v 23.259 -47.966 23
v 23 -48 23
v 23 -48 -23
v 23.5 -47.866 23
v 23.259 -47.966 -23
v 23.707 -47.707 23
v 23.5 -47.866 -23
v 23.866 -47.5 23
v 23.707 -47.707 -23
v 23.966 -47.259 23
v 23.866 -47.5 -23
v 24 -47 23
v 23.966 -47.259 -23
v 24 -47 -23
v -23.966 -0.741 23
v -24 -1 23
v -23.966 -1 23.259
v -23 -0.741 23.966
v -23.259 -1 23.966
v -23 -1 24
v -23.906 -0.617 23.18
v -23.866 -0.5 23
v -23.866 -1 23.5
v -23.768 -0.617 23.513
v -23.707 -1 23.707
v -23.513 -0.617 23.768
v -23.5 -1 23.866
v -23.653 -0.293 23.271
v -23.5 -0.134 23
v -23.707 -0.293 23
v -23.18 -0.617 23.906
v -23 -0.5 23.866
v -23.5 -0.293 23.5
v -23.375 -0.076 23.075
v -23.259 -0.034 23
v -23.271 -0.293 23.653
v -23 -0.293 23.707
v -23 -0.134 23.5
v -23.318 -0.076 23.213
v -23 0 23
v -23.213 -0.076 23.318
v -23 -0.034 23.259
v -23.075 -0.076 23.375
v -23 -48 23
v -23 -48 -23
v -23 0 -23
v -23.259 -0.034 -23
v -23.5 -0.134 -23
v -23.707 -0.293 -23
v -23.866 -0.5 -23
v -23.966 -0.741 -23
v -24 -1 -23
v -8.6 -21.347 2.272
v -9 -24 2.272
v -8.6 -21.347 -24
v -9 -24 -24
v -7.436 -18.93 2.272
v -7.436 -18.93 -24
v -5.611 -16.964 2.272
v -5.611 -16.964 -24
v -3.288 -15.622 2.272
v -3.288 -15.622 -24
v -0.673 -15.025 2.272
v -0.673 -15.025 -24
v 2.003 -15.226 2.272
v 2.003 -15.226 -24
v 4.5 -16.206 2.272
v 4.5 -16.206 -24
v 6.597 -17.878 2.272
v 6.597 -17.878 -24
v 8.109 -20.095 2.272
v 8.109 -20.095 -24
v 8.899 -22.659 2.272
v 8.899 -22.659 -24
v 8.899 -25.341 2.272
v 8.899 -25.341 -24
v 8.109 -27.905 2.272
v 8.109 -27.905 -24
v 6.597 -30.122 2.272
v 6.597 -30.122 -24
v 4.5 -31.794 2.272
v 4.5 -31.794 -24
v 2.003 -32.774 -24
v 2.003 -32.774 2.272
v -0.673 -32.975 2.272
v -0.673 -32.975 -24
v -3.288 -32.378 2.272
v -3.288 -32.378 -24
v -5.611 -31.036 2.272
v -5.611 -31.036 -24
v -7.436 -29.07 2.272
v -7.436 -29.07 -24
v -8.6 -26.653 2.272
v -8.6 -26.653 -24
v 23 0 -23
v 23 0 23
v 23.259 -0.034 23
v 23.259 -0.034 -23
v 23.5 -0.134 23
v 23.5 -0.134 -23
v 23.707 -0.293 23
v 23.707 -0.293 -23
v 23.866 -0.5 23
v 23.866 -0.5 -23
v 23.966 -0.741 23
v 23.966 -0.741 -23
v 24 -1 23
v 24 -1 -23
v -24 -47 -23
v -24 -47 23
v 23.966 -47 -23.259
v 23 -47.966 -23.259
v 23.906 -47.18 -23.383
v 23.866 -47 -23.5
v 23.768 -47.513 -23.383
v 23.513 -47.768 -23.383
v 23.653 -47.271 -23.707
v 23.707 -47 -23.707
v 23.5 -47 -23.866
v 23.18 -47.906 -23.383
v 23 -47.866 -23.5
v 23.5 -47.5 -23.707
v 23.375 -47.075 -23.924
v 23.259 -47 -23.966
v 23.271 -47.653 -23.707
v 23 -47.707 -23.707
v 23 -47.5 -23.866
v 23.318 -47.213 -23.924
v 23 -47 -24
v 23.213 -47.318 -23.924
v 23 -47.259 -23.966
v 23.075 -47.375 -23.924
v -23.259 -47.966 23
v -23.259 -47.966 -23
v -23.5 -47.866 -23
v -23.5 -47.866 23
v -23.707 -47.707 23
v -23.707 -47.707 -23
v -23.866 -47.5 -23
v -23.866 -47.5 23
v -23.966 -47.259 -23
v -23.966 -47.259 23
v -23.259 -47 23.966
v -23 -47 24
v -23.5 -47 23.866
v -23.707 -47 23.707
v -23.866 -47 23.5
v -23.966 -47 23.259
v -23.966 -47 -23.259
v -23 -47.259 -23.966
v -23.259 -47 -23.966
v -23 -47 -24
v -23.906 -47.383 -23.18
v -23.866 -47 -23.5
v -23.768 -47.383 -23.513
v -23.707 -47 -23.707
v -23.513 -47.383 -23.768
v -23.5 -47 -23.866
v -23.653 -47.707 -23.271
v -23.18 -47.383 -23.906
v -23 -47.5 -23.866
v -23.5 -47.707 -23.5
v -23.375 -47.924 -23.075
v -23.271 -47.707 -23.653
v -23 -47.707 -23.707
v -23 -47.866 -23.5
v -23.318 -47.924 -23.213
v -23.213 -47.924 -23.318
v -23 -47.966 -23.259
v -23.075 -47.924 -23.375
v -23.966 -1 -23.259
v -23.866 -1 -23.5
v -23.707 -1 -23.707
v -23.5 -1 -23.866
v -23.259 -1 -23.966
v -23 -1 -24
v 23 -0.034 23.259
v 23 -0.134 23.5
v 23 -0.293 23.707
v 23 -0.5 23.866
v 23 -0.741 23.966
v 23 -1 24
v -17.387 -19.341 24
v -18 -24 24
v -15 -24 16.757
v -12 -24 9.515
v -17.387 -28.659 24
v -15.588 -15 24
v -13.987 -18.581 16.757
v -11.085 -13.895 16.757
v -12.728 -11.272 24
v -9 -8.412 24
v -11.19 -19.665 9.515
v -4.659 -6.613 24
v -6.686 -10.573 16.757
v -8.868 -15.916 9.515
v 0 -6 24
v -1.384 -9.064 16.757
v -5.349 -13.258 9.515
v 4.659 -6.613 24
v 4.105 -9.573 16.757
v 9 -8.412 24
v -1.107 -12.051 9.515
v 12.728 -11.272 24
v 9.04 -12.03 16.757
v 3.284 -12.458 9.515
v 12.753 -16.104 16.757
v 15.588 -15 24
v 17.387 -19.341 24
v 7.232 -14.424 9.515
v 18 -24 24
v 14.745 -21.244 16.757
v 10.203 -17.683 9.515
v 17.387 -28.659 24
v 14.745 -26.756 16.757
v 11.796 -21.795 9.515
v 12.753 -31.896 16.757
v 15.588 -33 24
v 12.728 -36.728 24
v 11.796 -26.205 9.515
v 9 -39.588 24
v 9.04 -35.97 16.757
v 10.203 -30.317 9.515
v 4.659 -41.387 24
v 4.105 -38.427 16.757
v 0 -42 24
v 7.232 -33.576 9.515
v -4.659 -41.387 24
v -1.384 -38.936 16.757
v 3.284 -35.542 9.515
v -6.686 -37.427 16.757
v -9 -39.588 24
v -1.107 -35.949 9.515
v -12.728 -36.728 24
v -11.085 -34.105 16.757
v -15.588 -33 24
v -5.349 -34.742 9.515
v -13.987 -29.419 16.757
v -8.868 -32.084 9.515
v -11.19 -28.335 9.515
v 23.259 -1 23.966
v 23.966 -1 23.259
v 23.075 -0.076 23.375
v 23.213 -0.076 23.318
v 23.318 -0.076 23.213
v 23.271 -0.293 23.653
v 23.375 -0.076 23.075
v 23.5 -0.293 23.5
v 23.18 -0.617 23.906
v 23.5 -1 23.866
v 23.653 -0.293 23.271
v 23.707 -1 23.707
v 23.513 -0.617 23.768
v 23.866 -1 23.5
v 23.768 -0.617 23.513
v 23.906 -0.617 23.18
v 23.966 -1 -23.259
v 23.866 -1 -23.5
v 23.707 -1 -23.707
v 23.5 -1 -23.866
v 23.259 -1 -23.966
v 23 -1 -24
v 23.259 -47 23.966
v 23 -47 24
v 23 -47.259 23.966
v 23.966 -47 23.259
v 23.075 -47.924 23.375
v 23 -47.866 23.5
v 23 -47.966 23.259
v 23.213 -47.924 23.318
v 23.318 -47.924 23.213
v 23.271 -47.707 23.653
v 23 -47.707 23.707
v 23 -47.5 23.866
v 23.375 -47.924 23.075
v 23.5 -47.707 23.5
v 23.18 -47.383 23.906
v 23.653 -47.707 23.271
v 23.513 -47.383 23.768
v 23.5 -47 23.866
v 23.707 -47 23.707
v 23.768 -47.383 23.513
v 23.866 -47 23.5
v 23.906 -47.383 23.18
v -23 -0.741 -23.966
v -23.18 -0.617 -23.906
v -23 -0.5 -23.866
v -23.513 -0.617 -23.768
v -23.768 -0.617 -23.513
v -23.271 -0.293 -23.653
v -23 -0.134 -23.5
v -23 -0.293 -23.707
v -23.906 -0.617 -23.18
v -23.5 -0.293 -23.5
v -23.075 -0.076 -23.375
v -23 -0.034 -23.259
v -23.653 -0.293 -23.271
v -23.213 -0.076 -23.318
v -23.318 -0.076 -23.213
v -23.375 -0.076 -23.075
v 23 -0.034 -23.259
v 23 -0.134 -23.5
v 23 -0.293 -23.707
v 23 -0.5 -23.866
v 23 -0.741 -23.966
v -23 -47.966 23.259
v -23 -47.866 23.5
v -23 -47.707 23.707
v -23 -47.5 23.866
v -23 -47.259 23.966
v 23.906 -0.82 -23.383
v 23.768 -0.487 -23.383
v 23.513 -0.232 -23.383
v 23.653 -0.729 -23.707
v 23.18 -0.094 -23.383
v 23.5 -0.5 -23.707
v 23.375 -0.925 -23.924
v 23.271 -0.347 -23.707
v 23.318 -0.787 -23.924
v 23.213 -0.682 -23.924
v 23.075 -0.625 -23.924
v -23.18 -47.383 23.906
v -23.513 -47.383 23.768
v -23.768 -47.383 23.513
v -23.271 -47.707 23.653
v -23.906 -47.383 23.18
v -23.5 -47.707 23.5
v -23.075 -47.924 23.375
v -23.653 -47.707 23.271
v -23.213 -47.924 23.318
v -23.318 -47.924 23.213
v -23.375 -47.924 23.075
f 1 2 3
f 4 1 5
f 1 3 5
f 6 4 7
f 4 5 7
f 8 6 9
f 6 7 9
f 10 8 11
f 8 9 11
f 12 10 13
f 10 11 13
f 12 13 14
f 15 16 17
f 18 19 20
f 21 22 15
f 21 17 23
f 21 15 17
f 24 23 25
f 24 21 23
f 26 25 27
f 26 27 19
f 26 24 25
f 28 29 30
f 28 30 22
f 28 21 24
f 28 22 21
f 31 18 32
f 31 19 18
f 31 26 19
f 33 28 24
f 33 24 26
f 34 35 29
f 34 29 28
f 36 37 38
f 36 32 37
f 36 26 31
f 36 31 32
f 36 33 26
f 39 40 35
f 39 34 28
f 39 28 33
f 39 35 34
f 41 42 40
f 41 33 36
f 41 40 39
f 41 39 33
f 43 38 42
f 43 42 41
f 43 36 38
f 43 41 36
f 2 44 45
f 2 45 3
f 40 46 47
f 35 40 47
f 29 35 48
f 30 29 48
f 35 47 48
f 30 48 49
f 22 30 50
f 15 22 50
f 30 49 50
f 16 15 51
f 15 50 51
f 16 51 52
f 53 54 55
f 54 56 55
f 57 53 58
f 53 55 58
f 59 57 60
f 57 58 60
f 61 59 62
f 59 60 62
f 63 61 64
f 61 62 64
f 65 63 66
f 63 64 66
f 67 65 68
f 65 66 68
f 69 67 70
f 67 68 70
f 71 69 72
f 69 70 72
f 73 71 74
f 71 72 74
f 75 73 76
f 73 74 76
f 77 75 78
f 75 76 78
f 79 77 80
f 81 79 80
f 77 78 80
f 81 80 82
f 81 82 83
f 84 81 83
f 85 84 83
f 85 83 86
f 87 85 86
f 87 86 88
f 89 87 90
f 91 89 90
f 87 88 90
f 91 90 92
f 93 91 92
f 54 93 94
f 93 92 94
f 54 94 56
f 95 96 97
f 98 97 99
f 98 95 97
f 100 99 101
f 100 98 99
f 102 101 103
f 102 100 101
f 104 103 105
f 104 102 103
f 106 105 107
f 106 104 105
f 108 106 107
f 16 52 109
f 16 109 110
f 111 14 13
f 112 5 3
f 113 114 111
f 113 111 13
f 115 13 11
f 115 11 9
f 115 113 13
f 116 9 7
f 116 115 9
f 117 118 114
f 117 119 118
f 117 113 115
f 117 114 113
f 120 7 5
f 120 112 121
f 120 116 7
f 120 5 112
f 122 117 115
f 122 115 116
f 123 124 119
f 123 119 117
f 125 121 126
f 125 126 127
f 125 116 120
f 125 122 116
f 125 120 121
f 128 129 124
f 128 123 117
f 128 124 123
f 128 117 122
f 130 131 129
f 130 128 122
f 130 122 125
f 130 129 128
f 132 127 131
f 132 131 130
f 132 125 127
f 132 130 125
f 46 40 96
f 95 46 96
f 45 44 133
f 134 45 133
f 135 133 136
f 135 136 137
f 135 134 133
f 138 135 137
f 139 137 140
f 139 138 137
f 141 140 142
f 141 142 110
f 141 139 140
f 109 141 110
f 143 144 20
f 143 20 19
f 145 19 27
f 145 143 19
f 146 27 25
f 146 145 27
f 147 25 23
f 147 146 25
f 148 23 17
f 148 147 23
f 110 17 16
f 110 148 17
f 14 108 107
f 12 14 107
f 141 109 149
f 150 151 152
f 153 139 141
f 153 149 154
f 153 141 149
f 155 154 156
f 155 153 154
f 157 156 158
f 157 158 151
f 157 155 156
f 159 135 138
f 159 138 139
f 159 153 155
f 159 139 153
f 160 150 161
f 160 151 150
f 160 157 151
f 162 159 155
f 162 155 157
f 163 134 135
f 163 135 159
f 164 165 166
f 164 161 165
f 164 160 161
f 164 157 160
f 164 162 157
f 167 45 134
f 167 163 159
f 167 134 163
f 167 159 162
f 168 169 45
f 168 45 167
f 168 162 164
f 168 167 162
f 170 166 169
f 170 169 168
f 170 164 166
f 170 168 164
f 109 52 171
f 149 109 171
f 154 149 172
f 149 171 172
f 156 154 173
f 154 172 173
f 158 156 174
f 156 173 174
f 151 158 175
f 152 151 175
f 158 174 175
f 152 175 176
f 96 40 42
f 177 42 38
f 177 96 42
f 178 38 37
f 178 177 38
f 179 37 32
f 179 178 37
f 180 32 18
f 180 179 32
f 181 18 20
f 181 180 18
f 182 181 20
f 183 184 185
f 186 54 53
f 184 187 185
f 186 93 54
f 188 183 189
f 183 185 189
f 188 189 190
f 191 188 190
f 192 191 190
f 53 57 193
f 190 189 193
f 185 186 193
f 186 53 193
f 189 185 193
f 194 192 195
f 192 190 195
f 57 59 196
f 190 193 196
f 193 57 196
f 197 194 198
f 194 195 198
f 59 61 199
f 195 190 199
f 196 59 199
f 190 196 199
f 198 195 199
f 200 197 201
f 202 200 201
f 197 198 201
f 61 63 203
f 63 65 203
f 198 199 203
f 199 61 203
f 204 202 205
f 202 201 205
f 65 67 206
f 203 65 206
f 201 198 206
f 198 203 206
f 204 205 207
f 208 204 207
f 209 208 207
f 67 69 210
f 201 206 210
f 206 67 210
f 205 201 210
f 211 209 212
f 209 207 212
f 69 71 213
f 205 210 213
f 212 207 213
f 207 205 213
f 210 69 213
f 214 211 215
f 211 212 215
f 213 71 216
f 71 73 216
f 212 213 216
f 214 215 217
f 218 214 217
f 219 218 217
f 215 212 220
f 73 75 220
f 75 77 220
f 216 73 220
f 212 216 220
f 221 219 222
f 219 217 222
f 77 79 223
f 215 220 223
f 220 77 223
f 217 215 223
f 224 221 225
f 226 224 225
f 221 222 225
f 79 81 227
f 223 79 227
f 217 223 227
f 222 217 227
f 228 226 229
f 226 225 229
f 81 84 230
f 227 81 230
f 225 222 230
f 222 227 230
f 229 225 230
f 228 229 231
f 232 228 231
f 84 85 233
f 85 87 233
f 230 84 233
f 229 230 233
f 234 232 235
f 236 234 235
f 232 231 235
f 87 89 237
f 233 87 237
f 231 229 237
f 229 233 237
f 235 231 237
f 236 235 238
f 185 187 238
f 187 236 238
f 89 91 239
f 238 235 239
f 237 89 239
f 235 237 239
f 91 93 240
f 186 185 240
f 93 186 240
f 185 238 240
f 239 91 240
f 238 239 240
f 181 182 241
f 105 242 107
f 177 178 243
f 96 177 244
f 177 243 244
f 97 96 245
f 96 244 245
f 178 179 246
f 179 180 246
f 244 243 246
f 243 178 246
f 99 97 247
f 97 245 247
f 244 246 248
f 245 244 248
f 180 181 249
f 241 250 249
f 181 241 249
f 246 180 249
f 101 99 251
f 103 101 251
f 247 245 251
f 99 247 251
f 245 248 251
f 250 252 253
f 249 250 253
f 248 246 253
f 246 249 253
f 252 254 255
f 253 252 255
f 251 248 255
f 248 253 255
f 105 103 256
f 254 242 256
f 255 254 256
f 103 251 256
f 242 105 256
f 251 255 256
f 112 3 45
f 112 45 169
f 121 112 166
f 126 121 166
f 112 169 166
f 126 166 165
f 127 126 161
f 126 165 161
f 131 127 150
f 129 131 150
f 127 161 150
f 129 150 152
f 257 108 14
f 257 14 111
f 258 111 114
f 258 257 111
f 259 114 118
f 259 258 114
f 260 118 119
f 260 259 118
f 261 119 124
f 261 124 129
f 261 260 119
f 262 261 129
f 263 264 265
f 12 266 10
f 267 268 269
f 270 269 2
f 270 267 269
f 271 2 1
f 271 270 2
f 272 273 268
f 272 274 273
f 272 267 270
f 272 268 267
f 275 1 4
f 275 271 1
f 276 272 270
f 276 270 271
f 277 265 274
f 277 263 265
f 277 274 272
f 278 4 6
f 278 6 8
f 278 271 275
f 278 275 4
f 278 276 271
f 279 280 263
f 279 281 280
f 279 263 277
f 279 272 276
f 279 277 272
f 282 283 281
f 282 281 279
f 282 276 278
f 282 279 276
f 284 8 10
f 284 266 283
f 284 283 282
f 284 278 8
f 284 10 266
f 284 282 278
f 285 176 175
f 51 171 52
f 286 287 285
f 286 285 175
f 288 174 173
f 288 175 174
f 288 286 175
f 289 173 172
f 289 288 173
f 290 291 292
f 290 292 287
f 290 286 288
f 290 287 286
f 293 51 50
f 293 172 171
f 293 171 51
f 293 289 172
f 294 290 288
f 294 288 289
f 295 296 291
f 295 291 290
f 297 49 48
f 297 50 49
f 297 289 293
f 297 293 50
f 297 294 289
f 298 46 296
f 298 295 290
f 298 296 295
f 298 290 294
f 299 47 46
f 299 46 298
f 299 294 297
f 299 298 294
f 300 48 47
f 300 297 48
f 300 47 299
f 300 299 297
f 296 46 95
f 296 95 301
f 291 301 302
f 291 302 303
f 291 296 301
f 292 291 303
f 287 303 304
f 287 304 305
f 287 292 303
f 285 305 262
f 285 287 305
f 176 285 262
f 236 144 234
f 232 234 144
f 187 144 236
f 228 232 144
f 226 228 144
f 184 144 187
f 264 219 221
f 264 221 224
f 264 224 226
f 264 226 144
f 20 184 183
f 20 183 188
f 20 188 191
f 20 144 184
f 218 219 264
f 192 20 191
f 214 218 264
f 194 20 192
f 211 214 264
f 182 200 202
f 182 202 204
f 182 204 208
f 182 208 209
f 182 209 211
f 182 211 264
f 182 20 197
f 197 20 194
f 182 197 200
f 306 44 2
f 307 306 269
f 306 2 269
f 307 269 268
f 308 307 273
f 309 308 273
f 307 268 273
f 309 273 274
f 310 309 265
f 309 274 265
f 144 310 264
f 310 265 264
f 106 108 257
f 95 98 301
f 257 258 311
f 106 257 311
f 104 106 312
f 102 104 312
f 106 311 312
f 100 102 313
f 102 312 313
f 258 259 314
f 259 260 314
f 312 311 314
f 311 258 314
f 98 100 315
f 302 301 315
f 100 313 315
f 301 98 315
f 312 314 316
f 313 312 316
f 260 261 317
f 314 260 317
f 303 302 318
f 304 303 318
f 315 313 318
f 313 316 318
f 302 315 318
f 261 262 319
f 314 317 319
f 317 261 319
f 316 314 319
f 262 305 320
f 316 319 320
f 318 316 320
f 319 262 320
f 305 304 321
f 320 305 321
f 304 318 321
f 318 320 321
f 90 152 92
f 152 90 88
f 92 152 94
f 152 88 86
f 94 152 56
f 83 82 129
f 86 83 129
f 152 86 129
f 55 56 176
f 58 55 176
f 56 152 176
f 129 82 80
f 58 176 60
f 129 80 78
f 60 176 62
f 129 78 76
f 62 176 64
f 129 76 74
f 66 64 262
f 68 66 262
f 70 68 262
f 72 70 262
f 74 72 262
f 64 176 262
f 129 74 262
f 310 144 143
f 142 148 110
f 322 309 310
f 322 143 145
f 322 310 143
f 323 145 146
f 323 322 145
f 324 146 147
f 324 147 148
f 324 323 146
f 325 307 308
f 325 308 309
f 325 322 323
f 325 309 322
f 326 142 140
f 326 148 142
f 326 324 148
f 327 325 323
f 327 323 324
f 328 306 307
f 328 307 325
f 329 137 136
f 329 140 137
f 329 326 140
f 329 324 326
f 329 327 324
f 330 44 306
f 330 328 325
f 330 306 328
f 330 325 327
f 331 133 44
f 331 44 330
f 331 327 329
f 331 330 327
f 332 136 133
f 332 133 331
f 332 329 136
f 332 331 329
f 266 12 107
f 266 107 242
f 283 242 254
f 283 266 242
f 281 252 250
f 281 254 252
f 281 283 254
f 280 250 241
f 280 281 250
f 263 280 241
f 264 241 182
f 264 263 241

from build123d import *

# Parameters (mm, degrees)
F0_W           = 48
F0_H           = 48
F1_DEPTH       = 48
F2_R           = 1
F3_R           = 1
F4_T1_DEPTH    = 46
F4_T3_DEPTH    = 46
F4_T5_DEPTH    = 46
F4_S9_W        = 1
F4_S9_H        = 1
F4_T10_DEPTH   = 1
F4_S15_W       = 1
F4_S15_H       = 1
F4_T16_DEPTH   = 1
F4_S21_W       = 1
F4_S21_H       = 1
F4_T22_DEPTH   = 1
F4_S27_W       = 1
F4_S27_H       = 1
F4_T28_DEPTH   = 1
F4_T32_ANGLE   = 90
F4_T34_ANGLE   = 90
F6_D           = 18
F6_CSINK_D     = 36
F6_CSINK_ANGLE = 45


# Not quite as in the source:
# - a fillet or chamfer that OpenCascade refuses, or shapes differently, is made with other operations: its cross-section is extruded or revolved along the edge and cut away or added


with BuildPart() as f1:
    # F0 (on Front) → F1 (new body)
    with BuildSketch(Plane.XZ):
        Rectangle(F0_W, F0_H)
    extrude(amount=F1_DEPTH)

    # F2
    f2_edges = [f1.edges().sort_by_distance(p)[0] for p in [
        (24, -24, 24),
    ]]
    fillet(f2_edges, radius=F2_R)

    # F3
    f3_edges = [f1.edges().sort_by_distance(p)[0] for p in [
        (-24, -24, 24),
        (-0.5, 0, 24),
        (-0.5, -48, 24),
    ]]
    fillet(f3_edges, radius=F3_R)

    # F4: fillet of radius 1 on 8 edges, made by hand

    # F4_s2 → F4_t1 (cut)
    with BuildSketch(Plane.XY.offset(-23)):
        with BuildLine():
            ThreePointArc((-23, -48), (-23.7071067812, -47.7071067812), (-24, -47))
            Line((-24, -47), (-24, -48))
            Line((-24, -48), (-23, -48))
        make_face()
        with BuildLine():
            ThreePointArc((-23, 0), (-23.7071067812, -0.2928932188), (-24, -1))
            Line((-24, -1), (-24, 0))
            Line((-24, 0), (-23, 0))
        make_face()
    extrude(amount=F4_T1_DEPTH, mode=Mode.SUBTRACT)

    # F4_s4 → F4_t3 (cut)
    with BuildSketch(Plane.YZ.offset(-23)):
        with BuildLine():
            ThreePointArc((0, -23), (-0.2928932188, -23.7071067812), (-1, -24))
            Line((-1, -24), (0, -24))
            Line((0, -24), (0, -23))
        make_face()
        with BuildLine():
            ThreePointArc((-48, -23), (-47.7071067812, -23.7071067812), (-47, -24))
            Line((-47, -24), (-48, -24))
            Line((-48, -24), (-48, -23))
        make_face()
    extrude(amount=F4_T3_DEPTH, mode=Mode.SUBTRACT)

    # F4_s6 → F4_t5 (cut)
    with BuildSketch(Plane.XZ.offset(1)):
        with BuildLine():
            ThreePointArc((-24, -23), (-23.7071067812, -23.7071067812), (-23, -24))
            Line((-23, -24), (-24, -24))
            Line((-24, -24), (-24, -23))
        make_face()
        with BuildLine():
            ThreePointArc((24, -23), (23.7071067812, -23.7071067812), (23, -24))
            Line((23, -24), (24, -24))
            Line((24, -24), (24, -23))
        make_face()
    extrude(amount=F4_T5_DEPTH, mode=Mode.SUBTRACT)


with BuildPart() as f4_tool8:
    # F4_s9 → F4_t10 (new body)
    with BuildSketch(Plane.XZ.offset(1)):
        with Locations((-23.5, 23.5)):
            Rectangle(F4_S9_W, F4_S9_H)
    extrude(amount=-F4_T10_DEPTH)

    # F4_s11 → F4_t12 (revolve, cut)
    with BuildSketch(Plane(origin=(-23, -1, 23), x_dir=(0.7071067812, 0, -0.7071067812), z_dir=(0.7071067812, 0, 0.7071067812))):
        with BuildLine():
            ThreePointArc((0, -1), (1, 0), (0, 1))
            Line((0, 1), (0, -1))
        make_face()
    revolve(axis=Axis((-23, -1, 23), (0, 1, 0)), mode=Mode.SUBTRACT)


with BuildPart() as f1_1:
    add(f1.part)

    # F4_t7: cut F4_tool8
    add(f4_tool8.part, mode=Mode.SUBTRACT)


with BuildPart() as f4_tool14:
    # F4_s15 → F4_t16 (new body)
    with BuildSketch(Plane.XZ.offset(47)):
        with Locations((-23.5, 23.5)):
            Rectangle(F4_S15_W, F4_S15_H)
    extrude(amount=F4_T16_DEPTH)

    # F4_s17 → F4_t18 (revolve, cut)
    with BuildSketch(Plane(origin=(-23, -47, 23), x_dir=(0.7071067812, 0, -0.7071067812), z_dir=(-0.7071067812, 0, -0.7071067812))):
        with BuildLine():
            ThreePointArc((0, -1), (1, 0), (0, 1))
            Line((0, 1), (0, -1))
        make_face()
    revolve(axis=Axis((-23, -47, 23), (0, -1, 0)), mode=Mode.SUBTRACT)


with BuildPart() as f1_2:
    add(f1_1.part)

    # F4_t13: cut F4_tool14
    add(f4_tool14.part, mode=Mode.SUBTRACT)


with BuildPart() as f4_tool20:
    # F4_s21 → F4_t22 (new body)
    with BuildSketch(Plane.XZ.offset(47)):
        with Locations((-23.5, -23.5)):
            Rectangle(F4_S21_W, F4_S21_H)
    extrude(amount=F4_T22_DEPTH)

    # F4_s23 → F4_t24 (revolve, cut)
    with BuildSketch(Plane(origin=(-23, -47, -23), x_dir=(0.7071067812, 0, 0.7071067812), z_dir=(0.7071067812, 0, -0.7071067812))):
        with BuildLine():
            ThreePointArc((0, -1), (1, 0), (0, 1))
            Line((0, 1), (0, -1))
        make_face()
    revolve(axis=Axis((-23, -47, -23), (0, -1, 0)), mode=Mode.SUBTRACT)


with BuildPart() as f1_3:
    add(f1_2.part)

    # F4_t19: cut F4_tool20
    add(f4_tool20.part, mode=Mode.SUBTRACT)


with BuildPart() as f4_tool26:
    # F4_s27 → F4_t28 (new body)
    with BuildSketch(Plane.XZ.offset(1)):
        with Locations((-23.5, -23.5)):
            Rectangle(F4_S27_W, F4_S27_H)
    extrude(amount=-F4_T28_DEPTH)

    # F4_s29 → F4_t30 (revolve, cut)
    with BuildSketch(Plane(origin=(-23, -1, -23), x_dir=(0.7071067812, 0, 0.7071067812), z_dir=(-0.7071067812, 0, 0.7071067812))):
        with BuildLine():
            ThreePointArc((0, -1), (1, 0), (0, 1))
            Line((0, 1), (0, -1))
        make_face()
    revolve(axis=Axis((-23, -1, -23), (0, 1, 0)), mode=Mode.SUBTRACT)


with BuildPart() as f1_4:
    add(f1_3.part)

    # F4_t25: cut F4_tool26
    add(f4_tool26.part, mode=Mode.SUBTRACT)

    # F4_s31 → F4_t32 (revolve, cut)
    with BuildSketch(Plane.XZ.offset(1)):
        with BuildLine():
            ThreePointArc((24, -23), (23.7071067812, -23.7071067812), (23, -24))
            Line((23, -24), (24, -24))
            Line((24, -24), (24, -23))
        make_face()
    revolve(axis=Axis((23, -1, -24), (0, 0, 1)), revolution_arc=F4_T32_ANGLE, mode=Mode.SUBTRACT)

    # F4_s33 → F4_t34 (revolve, cut)
    with BuildSketch(Plane.XZ.offset(47)):
        with BuildLine():
            ThreePointArc((24, -23), (23.7071067812, -23.7071067812), (23, -24))
            Line((23, -24), (24, -24))
            Line((24, -24), (24, -23))
        make_face()
    revolve(axis=Axis((23, -47, -24), (0, 0, -1)), revolution_arc=F4_T34_ANGLE, mode=Mode.SUBTRACT)

    # F6 (through all)
    with Locations(Plane.XY.offset(24)):
        with Locations((0, -24)):
            CounterSinkHole(F6_D / 2, F6_CSINK_D / 2, counter_sink_angle=F6_CSINK_ANGLE)


solid = f1_4.part
